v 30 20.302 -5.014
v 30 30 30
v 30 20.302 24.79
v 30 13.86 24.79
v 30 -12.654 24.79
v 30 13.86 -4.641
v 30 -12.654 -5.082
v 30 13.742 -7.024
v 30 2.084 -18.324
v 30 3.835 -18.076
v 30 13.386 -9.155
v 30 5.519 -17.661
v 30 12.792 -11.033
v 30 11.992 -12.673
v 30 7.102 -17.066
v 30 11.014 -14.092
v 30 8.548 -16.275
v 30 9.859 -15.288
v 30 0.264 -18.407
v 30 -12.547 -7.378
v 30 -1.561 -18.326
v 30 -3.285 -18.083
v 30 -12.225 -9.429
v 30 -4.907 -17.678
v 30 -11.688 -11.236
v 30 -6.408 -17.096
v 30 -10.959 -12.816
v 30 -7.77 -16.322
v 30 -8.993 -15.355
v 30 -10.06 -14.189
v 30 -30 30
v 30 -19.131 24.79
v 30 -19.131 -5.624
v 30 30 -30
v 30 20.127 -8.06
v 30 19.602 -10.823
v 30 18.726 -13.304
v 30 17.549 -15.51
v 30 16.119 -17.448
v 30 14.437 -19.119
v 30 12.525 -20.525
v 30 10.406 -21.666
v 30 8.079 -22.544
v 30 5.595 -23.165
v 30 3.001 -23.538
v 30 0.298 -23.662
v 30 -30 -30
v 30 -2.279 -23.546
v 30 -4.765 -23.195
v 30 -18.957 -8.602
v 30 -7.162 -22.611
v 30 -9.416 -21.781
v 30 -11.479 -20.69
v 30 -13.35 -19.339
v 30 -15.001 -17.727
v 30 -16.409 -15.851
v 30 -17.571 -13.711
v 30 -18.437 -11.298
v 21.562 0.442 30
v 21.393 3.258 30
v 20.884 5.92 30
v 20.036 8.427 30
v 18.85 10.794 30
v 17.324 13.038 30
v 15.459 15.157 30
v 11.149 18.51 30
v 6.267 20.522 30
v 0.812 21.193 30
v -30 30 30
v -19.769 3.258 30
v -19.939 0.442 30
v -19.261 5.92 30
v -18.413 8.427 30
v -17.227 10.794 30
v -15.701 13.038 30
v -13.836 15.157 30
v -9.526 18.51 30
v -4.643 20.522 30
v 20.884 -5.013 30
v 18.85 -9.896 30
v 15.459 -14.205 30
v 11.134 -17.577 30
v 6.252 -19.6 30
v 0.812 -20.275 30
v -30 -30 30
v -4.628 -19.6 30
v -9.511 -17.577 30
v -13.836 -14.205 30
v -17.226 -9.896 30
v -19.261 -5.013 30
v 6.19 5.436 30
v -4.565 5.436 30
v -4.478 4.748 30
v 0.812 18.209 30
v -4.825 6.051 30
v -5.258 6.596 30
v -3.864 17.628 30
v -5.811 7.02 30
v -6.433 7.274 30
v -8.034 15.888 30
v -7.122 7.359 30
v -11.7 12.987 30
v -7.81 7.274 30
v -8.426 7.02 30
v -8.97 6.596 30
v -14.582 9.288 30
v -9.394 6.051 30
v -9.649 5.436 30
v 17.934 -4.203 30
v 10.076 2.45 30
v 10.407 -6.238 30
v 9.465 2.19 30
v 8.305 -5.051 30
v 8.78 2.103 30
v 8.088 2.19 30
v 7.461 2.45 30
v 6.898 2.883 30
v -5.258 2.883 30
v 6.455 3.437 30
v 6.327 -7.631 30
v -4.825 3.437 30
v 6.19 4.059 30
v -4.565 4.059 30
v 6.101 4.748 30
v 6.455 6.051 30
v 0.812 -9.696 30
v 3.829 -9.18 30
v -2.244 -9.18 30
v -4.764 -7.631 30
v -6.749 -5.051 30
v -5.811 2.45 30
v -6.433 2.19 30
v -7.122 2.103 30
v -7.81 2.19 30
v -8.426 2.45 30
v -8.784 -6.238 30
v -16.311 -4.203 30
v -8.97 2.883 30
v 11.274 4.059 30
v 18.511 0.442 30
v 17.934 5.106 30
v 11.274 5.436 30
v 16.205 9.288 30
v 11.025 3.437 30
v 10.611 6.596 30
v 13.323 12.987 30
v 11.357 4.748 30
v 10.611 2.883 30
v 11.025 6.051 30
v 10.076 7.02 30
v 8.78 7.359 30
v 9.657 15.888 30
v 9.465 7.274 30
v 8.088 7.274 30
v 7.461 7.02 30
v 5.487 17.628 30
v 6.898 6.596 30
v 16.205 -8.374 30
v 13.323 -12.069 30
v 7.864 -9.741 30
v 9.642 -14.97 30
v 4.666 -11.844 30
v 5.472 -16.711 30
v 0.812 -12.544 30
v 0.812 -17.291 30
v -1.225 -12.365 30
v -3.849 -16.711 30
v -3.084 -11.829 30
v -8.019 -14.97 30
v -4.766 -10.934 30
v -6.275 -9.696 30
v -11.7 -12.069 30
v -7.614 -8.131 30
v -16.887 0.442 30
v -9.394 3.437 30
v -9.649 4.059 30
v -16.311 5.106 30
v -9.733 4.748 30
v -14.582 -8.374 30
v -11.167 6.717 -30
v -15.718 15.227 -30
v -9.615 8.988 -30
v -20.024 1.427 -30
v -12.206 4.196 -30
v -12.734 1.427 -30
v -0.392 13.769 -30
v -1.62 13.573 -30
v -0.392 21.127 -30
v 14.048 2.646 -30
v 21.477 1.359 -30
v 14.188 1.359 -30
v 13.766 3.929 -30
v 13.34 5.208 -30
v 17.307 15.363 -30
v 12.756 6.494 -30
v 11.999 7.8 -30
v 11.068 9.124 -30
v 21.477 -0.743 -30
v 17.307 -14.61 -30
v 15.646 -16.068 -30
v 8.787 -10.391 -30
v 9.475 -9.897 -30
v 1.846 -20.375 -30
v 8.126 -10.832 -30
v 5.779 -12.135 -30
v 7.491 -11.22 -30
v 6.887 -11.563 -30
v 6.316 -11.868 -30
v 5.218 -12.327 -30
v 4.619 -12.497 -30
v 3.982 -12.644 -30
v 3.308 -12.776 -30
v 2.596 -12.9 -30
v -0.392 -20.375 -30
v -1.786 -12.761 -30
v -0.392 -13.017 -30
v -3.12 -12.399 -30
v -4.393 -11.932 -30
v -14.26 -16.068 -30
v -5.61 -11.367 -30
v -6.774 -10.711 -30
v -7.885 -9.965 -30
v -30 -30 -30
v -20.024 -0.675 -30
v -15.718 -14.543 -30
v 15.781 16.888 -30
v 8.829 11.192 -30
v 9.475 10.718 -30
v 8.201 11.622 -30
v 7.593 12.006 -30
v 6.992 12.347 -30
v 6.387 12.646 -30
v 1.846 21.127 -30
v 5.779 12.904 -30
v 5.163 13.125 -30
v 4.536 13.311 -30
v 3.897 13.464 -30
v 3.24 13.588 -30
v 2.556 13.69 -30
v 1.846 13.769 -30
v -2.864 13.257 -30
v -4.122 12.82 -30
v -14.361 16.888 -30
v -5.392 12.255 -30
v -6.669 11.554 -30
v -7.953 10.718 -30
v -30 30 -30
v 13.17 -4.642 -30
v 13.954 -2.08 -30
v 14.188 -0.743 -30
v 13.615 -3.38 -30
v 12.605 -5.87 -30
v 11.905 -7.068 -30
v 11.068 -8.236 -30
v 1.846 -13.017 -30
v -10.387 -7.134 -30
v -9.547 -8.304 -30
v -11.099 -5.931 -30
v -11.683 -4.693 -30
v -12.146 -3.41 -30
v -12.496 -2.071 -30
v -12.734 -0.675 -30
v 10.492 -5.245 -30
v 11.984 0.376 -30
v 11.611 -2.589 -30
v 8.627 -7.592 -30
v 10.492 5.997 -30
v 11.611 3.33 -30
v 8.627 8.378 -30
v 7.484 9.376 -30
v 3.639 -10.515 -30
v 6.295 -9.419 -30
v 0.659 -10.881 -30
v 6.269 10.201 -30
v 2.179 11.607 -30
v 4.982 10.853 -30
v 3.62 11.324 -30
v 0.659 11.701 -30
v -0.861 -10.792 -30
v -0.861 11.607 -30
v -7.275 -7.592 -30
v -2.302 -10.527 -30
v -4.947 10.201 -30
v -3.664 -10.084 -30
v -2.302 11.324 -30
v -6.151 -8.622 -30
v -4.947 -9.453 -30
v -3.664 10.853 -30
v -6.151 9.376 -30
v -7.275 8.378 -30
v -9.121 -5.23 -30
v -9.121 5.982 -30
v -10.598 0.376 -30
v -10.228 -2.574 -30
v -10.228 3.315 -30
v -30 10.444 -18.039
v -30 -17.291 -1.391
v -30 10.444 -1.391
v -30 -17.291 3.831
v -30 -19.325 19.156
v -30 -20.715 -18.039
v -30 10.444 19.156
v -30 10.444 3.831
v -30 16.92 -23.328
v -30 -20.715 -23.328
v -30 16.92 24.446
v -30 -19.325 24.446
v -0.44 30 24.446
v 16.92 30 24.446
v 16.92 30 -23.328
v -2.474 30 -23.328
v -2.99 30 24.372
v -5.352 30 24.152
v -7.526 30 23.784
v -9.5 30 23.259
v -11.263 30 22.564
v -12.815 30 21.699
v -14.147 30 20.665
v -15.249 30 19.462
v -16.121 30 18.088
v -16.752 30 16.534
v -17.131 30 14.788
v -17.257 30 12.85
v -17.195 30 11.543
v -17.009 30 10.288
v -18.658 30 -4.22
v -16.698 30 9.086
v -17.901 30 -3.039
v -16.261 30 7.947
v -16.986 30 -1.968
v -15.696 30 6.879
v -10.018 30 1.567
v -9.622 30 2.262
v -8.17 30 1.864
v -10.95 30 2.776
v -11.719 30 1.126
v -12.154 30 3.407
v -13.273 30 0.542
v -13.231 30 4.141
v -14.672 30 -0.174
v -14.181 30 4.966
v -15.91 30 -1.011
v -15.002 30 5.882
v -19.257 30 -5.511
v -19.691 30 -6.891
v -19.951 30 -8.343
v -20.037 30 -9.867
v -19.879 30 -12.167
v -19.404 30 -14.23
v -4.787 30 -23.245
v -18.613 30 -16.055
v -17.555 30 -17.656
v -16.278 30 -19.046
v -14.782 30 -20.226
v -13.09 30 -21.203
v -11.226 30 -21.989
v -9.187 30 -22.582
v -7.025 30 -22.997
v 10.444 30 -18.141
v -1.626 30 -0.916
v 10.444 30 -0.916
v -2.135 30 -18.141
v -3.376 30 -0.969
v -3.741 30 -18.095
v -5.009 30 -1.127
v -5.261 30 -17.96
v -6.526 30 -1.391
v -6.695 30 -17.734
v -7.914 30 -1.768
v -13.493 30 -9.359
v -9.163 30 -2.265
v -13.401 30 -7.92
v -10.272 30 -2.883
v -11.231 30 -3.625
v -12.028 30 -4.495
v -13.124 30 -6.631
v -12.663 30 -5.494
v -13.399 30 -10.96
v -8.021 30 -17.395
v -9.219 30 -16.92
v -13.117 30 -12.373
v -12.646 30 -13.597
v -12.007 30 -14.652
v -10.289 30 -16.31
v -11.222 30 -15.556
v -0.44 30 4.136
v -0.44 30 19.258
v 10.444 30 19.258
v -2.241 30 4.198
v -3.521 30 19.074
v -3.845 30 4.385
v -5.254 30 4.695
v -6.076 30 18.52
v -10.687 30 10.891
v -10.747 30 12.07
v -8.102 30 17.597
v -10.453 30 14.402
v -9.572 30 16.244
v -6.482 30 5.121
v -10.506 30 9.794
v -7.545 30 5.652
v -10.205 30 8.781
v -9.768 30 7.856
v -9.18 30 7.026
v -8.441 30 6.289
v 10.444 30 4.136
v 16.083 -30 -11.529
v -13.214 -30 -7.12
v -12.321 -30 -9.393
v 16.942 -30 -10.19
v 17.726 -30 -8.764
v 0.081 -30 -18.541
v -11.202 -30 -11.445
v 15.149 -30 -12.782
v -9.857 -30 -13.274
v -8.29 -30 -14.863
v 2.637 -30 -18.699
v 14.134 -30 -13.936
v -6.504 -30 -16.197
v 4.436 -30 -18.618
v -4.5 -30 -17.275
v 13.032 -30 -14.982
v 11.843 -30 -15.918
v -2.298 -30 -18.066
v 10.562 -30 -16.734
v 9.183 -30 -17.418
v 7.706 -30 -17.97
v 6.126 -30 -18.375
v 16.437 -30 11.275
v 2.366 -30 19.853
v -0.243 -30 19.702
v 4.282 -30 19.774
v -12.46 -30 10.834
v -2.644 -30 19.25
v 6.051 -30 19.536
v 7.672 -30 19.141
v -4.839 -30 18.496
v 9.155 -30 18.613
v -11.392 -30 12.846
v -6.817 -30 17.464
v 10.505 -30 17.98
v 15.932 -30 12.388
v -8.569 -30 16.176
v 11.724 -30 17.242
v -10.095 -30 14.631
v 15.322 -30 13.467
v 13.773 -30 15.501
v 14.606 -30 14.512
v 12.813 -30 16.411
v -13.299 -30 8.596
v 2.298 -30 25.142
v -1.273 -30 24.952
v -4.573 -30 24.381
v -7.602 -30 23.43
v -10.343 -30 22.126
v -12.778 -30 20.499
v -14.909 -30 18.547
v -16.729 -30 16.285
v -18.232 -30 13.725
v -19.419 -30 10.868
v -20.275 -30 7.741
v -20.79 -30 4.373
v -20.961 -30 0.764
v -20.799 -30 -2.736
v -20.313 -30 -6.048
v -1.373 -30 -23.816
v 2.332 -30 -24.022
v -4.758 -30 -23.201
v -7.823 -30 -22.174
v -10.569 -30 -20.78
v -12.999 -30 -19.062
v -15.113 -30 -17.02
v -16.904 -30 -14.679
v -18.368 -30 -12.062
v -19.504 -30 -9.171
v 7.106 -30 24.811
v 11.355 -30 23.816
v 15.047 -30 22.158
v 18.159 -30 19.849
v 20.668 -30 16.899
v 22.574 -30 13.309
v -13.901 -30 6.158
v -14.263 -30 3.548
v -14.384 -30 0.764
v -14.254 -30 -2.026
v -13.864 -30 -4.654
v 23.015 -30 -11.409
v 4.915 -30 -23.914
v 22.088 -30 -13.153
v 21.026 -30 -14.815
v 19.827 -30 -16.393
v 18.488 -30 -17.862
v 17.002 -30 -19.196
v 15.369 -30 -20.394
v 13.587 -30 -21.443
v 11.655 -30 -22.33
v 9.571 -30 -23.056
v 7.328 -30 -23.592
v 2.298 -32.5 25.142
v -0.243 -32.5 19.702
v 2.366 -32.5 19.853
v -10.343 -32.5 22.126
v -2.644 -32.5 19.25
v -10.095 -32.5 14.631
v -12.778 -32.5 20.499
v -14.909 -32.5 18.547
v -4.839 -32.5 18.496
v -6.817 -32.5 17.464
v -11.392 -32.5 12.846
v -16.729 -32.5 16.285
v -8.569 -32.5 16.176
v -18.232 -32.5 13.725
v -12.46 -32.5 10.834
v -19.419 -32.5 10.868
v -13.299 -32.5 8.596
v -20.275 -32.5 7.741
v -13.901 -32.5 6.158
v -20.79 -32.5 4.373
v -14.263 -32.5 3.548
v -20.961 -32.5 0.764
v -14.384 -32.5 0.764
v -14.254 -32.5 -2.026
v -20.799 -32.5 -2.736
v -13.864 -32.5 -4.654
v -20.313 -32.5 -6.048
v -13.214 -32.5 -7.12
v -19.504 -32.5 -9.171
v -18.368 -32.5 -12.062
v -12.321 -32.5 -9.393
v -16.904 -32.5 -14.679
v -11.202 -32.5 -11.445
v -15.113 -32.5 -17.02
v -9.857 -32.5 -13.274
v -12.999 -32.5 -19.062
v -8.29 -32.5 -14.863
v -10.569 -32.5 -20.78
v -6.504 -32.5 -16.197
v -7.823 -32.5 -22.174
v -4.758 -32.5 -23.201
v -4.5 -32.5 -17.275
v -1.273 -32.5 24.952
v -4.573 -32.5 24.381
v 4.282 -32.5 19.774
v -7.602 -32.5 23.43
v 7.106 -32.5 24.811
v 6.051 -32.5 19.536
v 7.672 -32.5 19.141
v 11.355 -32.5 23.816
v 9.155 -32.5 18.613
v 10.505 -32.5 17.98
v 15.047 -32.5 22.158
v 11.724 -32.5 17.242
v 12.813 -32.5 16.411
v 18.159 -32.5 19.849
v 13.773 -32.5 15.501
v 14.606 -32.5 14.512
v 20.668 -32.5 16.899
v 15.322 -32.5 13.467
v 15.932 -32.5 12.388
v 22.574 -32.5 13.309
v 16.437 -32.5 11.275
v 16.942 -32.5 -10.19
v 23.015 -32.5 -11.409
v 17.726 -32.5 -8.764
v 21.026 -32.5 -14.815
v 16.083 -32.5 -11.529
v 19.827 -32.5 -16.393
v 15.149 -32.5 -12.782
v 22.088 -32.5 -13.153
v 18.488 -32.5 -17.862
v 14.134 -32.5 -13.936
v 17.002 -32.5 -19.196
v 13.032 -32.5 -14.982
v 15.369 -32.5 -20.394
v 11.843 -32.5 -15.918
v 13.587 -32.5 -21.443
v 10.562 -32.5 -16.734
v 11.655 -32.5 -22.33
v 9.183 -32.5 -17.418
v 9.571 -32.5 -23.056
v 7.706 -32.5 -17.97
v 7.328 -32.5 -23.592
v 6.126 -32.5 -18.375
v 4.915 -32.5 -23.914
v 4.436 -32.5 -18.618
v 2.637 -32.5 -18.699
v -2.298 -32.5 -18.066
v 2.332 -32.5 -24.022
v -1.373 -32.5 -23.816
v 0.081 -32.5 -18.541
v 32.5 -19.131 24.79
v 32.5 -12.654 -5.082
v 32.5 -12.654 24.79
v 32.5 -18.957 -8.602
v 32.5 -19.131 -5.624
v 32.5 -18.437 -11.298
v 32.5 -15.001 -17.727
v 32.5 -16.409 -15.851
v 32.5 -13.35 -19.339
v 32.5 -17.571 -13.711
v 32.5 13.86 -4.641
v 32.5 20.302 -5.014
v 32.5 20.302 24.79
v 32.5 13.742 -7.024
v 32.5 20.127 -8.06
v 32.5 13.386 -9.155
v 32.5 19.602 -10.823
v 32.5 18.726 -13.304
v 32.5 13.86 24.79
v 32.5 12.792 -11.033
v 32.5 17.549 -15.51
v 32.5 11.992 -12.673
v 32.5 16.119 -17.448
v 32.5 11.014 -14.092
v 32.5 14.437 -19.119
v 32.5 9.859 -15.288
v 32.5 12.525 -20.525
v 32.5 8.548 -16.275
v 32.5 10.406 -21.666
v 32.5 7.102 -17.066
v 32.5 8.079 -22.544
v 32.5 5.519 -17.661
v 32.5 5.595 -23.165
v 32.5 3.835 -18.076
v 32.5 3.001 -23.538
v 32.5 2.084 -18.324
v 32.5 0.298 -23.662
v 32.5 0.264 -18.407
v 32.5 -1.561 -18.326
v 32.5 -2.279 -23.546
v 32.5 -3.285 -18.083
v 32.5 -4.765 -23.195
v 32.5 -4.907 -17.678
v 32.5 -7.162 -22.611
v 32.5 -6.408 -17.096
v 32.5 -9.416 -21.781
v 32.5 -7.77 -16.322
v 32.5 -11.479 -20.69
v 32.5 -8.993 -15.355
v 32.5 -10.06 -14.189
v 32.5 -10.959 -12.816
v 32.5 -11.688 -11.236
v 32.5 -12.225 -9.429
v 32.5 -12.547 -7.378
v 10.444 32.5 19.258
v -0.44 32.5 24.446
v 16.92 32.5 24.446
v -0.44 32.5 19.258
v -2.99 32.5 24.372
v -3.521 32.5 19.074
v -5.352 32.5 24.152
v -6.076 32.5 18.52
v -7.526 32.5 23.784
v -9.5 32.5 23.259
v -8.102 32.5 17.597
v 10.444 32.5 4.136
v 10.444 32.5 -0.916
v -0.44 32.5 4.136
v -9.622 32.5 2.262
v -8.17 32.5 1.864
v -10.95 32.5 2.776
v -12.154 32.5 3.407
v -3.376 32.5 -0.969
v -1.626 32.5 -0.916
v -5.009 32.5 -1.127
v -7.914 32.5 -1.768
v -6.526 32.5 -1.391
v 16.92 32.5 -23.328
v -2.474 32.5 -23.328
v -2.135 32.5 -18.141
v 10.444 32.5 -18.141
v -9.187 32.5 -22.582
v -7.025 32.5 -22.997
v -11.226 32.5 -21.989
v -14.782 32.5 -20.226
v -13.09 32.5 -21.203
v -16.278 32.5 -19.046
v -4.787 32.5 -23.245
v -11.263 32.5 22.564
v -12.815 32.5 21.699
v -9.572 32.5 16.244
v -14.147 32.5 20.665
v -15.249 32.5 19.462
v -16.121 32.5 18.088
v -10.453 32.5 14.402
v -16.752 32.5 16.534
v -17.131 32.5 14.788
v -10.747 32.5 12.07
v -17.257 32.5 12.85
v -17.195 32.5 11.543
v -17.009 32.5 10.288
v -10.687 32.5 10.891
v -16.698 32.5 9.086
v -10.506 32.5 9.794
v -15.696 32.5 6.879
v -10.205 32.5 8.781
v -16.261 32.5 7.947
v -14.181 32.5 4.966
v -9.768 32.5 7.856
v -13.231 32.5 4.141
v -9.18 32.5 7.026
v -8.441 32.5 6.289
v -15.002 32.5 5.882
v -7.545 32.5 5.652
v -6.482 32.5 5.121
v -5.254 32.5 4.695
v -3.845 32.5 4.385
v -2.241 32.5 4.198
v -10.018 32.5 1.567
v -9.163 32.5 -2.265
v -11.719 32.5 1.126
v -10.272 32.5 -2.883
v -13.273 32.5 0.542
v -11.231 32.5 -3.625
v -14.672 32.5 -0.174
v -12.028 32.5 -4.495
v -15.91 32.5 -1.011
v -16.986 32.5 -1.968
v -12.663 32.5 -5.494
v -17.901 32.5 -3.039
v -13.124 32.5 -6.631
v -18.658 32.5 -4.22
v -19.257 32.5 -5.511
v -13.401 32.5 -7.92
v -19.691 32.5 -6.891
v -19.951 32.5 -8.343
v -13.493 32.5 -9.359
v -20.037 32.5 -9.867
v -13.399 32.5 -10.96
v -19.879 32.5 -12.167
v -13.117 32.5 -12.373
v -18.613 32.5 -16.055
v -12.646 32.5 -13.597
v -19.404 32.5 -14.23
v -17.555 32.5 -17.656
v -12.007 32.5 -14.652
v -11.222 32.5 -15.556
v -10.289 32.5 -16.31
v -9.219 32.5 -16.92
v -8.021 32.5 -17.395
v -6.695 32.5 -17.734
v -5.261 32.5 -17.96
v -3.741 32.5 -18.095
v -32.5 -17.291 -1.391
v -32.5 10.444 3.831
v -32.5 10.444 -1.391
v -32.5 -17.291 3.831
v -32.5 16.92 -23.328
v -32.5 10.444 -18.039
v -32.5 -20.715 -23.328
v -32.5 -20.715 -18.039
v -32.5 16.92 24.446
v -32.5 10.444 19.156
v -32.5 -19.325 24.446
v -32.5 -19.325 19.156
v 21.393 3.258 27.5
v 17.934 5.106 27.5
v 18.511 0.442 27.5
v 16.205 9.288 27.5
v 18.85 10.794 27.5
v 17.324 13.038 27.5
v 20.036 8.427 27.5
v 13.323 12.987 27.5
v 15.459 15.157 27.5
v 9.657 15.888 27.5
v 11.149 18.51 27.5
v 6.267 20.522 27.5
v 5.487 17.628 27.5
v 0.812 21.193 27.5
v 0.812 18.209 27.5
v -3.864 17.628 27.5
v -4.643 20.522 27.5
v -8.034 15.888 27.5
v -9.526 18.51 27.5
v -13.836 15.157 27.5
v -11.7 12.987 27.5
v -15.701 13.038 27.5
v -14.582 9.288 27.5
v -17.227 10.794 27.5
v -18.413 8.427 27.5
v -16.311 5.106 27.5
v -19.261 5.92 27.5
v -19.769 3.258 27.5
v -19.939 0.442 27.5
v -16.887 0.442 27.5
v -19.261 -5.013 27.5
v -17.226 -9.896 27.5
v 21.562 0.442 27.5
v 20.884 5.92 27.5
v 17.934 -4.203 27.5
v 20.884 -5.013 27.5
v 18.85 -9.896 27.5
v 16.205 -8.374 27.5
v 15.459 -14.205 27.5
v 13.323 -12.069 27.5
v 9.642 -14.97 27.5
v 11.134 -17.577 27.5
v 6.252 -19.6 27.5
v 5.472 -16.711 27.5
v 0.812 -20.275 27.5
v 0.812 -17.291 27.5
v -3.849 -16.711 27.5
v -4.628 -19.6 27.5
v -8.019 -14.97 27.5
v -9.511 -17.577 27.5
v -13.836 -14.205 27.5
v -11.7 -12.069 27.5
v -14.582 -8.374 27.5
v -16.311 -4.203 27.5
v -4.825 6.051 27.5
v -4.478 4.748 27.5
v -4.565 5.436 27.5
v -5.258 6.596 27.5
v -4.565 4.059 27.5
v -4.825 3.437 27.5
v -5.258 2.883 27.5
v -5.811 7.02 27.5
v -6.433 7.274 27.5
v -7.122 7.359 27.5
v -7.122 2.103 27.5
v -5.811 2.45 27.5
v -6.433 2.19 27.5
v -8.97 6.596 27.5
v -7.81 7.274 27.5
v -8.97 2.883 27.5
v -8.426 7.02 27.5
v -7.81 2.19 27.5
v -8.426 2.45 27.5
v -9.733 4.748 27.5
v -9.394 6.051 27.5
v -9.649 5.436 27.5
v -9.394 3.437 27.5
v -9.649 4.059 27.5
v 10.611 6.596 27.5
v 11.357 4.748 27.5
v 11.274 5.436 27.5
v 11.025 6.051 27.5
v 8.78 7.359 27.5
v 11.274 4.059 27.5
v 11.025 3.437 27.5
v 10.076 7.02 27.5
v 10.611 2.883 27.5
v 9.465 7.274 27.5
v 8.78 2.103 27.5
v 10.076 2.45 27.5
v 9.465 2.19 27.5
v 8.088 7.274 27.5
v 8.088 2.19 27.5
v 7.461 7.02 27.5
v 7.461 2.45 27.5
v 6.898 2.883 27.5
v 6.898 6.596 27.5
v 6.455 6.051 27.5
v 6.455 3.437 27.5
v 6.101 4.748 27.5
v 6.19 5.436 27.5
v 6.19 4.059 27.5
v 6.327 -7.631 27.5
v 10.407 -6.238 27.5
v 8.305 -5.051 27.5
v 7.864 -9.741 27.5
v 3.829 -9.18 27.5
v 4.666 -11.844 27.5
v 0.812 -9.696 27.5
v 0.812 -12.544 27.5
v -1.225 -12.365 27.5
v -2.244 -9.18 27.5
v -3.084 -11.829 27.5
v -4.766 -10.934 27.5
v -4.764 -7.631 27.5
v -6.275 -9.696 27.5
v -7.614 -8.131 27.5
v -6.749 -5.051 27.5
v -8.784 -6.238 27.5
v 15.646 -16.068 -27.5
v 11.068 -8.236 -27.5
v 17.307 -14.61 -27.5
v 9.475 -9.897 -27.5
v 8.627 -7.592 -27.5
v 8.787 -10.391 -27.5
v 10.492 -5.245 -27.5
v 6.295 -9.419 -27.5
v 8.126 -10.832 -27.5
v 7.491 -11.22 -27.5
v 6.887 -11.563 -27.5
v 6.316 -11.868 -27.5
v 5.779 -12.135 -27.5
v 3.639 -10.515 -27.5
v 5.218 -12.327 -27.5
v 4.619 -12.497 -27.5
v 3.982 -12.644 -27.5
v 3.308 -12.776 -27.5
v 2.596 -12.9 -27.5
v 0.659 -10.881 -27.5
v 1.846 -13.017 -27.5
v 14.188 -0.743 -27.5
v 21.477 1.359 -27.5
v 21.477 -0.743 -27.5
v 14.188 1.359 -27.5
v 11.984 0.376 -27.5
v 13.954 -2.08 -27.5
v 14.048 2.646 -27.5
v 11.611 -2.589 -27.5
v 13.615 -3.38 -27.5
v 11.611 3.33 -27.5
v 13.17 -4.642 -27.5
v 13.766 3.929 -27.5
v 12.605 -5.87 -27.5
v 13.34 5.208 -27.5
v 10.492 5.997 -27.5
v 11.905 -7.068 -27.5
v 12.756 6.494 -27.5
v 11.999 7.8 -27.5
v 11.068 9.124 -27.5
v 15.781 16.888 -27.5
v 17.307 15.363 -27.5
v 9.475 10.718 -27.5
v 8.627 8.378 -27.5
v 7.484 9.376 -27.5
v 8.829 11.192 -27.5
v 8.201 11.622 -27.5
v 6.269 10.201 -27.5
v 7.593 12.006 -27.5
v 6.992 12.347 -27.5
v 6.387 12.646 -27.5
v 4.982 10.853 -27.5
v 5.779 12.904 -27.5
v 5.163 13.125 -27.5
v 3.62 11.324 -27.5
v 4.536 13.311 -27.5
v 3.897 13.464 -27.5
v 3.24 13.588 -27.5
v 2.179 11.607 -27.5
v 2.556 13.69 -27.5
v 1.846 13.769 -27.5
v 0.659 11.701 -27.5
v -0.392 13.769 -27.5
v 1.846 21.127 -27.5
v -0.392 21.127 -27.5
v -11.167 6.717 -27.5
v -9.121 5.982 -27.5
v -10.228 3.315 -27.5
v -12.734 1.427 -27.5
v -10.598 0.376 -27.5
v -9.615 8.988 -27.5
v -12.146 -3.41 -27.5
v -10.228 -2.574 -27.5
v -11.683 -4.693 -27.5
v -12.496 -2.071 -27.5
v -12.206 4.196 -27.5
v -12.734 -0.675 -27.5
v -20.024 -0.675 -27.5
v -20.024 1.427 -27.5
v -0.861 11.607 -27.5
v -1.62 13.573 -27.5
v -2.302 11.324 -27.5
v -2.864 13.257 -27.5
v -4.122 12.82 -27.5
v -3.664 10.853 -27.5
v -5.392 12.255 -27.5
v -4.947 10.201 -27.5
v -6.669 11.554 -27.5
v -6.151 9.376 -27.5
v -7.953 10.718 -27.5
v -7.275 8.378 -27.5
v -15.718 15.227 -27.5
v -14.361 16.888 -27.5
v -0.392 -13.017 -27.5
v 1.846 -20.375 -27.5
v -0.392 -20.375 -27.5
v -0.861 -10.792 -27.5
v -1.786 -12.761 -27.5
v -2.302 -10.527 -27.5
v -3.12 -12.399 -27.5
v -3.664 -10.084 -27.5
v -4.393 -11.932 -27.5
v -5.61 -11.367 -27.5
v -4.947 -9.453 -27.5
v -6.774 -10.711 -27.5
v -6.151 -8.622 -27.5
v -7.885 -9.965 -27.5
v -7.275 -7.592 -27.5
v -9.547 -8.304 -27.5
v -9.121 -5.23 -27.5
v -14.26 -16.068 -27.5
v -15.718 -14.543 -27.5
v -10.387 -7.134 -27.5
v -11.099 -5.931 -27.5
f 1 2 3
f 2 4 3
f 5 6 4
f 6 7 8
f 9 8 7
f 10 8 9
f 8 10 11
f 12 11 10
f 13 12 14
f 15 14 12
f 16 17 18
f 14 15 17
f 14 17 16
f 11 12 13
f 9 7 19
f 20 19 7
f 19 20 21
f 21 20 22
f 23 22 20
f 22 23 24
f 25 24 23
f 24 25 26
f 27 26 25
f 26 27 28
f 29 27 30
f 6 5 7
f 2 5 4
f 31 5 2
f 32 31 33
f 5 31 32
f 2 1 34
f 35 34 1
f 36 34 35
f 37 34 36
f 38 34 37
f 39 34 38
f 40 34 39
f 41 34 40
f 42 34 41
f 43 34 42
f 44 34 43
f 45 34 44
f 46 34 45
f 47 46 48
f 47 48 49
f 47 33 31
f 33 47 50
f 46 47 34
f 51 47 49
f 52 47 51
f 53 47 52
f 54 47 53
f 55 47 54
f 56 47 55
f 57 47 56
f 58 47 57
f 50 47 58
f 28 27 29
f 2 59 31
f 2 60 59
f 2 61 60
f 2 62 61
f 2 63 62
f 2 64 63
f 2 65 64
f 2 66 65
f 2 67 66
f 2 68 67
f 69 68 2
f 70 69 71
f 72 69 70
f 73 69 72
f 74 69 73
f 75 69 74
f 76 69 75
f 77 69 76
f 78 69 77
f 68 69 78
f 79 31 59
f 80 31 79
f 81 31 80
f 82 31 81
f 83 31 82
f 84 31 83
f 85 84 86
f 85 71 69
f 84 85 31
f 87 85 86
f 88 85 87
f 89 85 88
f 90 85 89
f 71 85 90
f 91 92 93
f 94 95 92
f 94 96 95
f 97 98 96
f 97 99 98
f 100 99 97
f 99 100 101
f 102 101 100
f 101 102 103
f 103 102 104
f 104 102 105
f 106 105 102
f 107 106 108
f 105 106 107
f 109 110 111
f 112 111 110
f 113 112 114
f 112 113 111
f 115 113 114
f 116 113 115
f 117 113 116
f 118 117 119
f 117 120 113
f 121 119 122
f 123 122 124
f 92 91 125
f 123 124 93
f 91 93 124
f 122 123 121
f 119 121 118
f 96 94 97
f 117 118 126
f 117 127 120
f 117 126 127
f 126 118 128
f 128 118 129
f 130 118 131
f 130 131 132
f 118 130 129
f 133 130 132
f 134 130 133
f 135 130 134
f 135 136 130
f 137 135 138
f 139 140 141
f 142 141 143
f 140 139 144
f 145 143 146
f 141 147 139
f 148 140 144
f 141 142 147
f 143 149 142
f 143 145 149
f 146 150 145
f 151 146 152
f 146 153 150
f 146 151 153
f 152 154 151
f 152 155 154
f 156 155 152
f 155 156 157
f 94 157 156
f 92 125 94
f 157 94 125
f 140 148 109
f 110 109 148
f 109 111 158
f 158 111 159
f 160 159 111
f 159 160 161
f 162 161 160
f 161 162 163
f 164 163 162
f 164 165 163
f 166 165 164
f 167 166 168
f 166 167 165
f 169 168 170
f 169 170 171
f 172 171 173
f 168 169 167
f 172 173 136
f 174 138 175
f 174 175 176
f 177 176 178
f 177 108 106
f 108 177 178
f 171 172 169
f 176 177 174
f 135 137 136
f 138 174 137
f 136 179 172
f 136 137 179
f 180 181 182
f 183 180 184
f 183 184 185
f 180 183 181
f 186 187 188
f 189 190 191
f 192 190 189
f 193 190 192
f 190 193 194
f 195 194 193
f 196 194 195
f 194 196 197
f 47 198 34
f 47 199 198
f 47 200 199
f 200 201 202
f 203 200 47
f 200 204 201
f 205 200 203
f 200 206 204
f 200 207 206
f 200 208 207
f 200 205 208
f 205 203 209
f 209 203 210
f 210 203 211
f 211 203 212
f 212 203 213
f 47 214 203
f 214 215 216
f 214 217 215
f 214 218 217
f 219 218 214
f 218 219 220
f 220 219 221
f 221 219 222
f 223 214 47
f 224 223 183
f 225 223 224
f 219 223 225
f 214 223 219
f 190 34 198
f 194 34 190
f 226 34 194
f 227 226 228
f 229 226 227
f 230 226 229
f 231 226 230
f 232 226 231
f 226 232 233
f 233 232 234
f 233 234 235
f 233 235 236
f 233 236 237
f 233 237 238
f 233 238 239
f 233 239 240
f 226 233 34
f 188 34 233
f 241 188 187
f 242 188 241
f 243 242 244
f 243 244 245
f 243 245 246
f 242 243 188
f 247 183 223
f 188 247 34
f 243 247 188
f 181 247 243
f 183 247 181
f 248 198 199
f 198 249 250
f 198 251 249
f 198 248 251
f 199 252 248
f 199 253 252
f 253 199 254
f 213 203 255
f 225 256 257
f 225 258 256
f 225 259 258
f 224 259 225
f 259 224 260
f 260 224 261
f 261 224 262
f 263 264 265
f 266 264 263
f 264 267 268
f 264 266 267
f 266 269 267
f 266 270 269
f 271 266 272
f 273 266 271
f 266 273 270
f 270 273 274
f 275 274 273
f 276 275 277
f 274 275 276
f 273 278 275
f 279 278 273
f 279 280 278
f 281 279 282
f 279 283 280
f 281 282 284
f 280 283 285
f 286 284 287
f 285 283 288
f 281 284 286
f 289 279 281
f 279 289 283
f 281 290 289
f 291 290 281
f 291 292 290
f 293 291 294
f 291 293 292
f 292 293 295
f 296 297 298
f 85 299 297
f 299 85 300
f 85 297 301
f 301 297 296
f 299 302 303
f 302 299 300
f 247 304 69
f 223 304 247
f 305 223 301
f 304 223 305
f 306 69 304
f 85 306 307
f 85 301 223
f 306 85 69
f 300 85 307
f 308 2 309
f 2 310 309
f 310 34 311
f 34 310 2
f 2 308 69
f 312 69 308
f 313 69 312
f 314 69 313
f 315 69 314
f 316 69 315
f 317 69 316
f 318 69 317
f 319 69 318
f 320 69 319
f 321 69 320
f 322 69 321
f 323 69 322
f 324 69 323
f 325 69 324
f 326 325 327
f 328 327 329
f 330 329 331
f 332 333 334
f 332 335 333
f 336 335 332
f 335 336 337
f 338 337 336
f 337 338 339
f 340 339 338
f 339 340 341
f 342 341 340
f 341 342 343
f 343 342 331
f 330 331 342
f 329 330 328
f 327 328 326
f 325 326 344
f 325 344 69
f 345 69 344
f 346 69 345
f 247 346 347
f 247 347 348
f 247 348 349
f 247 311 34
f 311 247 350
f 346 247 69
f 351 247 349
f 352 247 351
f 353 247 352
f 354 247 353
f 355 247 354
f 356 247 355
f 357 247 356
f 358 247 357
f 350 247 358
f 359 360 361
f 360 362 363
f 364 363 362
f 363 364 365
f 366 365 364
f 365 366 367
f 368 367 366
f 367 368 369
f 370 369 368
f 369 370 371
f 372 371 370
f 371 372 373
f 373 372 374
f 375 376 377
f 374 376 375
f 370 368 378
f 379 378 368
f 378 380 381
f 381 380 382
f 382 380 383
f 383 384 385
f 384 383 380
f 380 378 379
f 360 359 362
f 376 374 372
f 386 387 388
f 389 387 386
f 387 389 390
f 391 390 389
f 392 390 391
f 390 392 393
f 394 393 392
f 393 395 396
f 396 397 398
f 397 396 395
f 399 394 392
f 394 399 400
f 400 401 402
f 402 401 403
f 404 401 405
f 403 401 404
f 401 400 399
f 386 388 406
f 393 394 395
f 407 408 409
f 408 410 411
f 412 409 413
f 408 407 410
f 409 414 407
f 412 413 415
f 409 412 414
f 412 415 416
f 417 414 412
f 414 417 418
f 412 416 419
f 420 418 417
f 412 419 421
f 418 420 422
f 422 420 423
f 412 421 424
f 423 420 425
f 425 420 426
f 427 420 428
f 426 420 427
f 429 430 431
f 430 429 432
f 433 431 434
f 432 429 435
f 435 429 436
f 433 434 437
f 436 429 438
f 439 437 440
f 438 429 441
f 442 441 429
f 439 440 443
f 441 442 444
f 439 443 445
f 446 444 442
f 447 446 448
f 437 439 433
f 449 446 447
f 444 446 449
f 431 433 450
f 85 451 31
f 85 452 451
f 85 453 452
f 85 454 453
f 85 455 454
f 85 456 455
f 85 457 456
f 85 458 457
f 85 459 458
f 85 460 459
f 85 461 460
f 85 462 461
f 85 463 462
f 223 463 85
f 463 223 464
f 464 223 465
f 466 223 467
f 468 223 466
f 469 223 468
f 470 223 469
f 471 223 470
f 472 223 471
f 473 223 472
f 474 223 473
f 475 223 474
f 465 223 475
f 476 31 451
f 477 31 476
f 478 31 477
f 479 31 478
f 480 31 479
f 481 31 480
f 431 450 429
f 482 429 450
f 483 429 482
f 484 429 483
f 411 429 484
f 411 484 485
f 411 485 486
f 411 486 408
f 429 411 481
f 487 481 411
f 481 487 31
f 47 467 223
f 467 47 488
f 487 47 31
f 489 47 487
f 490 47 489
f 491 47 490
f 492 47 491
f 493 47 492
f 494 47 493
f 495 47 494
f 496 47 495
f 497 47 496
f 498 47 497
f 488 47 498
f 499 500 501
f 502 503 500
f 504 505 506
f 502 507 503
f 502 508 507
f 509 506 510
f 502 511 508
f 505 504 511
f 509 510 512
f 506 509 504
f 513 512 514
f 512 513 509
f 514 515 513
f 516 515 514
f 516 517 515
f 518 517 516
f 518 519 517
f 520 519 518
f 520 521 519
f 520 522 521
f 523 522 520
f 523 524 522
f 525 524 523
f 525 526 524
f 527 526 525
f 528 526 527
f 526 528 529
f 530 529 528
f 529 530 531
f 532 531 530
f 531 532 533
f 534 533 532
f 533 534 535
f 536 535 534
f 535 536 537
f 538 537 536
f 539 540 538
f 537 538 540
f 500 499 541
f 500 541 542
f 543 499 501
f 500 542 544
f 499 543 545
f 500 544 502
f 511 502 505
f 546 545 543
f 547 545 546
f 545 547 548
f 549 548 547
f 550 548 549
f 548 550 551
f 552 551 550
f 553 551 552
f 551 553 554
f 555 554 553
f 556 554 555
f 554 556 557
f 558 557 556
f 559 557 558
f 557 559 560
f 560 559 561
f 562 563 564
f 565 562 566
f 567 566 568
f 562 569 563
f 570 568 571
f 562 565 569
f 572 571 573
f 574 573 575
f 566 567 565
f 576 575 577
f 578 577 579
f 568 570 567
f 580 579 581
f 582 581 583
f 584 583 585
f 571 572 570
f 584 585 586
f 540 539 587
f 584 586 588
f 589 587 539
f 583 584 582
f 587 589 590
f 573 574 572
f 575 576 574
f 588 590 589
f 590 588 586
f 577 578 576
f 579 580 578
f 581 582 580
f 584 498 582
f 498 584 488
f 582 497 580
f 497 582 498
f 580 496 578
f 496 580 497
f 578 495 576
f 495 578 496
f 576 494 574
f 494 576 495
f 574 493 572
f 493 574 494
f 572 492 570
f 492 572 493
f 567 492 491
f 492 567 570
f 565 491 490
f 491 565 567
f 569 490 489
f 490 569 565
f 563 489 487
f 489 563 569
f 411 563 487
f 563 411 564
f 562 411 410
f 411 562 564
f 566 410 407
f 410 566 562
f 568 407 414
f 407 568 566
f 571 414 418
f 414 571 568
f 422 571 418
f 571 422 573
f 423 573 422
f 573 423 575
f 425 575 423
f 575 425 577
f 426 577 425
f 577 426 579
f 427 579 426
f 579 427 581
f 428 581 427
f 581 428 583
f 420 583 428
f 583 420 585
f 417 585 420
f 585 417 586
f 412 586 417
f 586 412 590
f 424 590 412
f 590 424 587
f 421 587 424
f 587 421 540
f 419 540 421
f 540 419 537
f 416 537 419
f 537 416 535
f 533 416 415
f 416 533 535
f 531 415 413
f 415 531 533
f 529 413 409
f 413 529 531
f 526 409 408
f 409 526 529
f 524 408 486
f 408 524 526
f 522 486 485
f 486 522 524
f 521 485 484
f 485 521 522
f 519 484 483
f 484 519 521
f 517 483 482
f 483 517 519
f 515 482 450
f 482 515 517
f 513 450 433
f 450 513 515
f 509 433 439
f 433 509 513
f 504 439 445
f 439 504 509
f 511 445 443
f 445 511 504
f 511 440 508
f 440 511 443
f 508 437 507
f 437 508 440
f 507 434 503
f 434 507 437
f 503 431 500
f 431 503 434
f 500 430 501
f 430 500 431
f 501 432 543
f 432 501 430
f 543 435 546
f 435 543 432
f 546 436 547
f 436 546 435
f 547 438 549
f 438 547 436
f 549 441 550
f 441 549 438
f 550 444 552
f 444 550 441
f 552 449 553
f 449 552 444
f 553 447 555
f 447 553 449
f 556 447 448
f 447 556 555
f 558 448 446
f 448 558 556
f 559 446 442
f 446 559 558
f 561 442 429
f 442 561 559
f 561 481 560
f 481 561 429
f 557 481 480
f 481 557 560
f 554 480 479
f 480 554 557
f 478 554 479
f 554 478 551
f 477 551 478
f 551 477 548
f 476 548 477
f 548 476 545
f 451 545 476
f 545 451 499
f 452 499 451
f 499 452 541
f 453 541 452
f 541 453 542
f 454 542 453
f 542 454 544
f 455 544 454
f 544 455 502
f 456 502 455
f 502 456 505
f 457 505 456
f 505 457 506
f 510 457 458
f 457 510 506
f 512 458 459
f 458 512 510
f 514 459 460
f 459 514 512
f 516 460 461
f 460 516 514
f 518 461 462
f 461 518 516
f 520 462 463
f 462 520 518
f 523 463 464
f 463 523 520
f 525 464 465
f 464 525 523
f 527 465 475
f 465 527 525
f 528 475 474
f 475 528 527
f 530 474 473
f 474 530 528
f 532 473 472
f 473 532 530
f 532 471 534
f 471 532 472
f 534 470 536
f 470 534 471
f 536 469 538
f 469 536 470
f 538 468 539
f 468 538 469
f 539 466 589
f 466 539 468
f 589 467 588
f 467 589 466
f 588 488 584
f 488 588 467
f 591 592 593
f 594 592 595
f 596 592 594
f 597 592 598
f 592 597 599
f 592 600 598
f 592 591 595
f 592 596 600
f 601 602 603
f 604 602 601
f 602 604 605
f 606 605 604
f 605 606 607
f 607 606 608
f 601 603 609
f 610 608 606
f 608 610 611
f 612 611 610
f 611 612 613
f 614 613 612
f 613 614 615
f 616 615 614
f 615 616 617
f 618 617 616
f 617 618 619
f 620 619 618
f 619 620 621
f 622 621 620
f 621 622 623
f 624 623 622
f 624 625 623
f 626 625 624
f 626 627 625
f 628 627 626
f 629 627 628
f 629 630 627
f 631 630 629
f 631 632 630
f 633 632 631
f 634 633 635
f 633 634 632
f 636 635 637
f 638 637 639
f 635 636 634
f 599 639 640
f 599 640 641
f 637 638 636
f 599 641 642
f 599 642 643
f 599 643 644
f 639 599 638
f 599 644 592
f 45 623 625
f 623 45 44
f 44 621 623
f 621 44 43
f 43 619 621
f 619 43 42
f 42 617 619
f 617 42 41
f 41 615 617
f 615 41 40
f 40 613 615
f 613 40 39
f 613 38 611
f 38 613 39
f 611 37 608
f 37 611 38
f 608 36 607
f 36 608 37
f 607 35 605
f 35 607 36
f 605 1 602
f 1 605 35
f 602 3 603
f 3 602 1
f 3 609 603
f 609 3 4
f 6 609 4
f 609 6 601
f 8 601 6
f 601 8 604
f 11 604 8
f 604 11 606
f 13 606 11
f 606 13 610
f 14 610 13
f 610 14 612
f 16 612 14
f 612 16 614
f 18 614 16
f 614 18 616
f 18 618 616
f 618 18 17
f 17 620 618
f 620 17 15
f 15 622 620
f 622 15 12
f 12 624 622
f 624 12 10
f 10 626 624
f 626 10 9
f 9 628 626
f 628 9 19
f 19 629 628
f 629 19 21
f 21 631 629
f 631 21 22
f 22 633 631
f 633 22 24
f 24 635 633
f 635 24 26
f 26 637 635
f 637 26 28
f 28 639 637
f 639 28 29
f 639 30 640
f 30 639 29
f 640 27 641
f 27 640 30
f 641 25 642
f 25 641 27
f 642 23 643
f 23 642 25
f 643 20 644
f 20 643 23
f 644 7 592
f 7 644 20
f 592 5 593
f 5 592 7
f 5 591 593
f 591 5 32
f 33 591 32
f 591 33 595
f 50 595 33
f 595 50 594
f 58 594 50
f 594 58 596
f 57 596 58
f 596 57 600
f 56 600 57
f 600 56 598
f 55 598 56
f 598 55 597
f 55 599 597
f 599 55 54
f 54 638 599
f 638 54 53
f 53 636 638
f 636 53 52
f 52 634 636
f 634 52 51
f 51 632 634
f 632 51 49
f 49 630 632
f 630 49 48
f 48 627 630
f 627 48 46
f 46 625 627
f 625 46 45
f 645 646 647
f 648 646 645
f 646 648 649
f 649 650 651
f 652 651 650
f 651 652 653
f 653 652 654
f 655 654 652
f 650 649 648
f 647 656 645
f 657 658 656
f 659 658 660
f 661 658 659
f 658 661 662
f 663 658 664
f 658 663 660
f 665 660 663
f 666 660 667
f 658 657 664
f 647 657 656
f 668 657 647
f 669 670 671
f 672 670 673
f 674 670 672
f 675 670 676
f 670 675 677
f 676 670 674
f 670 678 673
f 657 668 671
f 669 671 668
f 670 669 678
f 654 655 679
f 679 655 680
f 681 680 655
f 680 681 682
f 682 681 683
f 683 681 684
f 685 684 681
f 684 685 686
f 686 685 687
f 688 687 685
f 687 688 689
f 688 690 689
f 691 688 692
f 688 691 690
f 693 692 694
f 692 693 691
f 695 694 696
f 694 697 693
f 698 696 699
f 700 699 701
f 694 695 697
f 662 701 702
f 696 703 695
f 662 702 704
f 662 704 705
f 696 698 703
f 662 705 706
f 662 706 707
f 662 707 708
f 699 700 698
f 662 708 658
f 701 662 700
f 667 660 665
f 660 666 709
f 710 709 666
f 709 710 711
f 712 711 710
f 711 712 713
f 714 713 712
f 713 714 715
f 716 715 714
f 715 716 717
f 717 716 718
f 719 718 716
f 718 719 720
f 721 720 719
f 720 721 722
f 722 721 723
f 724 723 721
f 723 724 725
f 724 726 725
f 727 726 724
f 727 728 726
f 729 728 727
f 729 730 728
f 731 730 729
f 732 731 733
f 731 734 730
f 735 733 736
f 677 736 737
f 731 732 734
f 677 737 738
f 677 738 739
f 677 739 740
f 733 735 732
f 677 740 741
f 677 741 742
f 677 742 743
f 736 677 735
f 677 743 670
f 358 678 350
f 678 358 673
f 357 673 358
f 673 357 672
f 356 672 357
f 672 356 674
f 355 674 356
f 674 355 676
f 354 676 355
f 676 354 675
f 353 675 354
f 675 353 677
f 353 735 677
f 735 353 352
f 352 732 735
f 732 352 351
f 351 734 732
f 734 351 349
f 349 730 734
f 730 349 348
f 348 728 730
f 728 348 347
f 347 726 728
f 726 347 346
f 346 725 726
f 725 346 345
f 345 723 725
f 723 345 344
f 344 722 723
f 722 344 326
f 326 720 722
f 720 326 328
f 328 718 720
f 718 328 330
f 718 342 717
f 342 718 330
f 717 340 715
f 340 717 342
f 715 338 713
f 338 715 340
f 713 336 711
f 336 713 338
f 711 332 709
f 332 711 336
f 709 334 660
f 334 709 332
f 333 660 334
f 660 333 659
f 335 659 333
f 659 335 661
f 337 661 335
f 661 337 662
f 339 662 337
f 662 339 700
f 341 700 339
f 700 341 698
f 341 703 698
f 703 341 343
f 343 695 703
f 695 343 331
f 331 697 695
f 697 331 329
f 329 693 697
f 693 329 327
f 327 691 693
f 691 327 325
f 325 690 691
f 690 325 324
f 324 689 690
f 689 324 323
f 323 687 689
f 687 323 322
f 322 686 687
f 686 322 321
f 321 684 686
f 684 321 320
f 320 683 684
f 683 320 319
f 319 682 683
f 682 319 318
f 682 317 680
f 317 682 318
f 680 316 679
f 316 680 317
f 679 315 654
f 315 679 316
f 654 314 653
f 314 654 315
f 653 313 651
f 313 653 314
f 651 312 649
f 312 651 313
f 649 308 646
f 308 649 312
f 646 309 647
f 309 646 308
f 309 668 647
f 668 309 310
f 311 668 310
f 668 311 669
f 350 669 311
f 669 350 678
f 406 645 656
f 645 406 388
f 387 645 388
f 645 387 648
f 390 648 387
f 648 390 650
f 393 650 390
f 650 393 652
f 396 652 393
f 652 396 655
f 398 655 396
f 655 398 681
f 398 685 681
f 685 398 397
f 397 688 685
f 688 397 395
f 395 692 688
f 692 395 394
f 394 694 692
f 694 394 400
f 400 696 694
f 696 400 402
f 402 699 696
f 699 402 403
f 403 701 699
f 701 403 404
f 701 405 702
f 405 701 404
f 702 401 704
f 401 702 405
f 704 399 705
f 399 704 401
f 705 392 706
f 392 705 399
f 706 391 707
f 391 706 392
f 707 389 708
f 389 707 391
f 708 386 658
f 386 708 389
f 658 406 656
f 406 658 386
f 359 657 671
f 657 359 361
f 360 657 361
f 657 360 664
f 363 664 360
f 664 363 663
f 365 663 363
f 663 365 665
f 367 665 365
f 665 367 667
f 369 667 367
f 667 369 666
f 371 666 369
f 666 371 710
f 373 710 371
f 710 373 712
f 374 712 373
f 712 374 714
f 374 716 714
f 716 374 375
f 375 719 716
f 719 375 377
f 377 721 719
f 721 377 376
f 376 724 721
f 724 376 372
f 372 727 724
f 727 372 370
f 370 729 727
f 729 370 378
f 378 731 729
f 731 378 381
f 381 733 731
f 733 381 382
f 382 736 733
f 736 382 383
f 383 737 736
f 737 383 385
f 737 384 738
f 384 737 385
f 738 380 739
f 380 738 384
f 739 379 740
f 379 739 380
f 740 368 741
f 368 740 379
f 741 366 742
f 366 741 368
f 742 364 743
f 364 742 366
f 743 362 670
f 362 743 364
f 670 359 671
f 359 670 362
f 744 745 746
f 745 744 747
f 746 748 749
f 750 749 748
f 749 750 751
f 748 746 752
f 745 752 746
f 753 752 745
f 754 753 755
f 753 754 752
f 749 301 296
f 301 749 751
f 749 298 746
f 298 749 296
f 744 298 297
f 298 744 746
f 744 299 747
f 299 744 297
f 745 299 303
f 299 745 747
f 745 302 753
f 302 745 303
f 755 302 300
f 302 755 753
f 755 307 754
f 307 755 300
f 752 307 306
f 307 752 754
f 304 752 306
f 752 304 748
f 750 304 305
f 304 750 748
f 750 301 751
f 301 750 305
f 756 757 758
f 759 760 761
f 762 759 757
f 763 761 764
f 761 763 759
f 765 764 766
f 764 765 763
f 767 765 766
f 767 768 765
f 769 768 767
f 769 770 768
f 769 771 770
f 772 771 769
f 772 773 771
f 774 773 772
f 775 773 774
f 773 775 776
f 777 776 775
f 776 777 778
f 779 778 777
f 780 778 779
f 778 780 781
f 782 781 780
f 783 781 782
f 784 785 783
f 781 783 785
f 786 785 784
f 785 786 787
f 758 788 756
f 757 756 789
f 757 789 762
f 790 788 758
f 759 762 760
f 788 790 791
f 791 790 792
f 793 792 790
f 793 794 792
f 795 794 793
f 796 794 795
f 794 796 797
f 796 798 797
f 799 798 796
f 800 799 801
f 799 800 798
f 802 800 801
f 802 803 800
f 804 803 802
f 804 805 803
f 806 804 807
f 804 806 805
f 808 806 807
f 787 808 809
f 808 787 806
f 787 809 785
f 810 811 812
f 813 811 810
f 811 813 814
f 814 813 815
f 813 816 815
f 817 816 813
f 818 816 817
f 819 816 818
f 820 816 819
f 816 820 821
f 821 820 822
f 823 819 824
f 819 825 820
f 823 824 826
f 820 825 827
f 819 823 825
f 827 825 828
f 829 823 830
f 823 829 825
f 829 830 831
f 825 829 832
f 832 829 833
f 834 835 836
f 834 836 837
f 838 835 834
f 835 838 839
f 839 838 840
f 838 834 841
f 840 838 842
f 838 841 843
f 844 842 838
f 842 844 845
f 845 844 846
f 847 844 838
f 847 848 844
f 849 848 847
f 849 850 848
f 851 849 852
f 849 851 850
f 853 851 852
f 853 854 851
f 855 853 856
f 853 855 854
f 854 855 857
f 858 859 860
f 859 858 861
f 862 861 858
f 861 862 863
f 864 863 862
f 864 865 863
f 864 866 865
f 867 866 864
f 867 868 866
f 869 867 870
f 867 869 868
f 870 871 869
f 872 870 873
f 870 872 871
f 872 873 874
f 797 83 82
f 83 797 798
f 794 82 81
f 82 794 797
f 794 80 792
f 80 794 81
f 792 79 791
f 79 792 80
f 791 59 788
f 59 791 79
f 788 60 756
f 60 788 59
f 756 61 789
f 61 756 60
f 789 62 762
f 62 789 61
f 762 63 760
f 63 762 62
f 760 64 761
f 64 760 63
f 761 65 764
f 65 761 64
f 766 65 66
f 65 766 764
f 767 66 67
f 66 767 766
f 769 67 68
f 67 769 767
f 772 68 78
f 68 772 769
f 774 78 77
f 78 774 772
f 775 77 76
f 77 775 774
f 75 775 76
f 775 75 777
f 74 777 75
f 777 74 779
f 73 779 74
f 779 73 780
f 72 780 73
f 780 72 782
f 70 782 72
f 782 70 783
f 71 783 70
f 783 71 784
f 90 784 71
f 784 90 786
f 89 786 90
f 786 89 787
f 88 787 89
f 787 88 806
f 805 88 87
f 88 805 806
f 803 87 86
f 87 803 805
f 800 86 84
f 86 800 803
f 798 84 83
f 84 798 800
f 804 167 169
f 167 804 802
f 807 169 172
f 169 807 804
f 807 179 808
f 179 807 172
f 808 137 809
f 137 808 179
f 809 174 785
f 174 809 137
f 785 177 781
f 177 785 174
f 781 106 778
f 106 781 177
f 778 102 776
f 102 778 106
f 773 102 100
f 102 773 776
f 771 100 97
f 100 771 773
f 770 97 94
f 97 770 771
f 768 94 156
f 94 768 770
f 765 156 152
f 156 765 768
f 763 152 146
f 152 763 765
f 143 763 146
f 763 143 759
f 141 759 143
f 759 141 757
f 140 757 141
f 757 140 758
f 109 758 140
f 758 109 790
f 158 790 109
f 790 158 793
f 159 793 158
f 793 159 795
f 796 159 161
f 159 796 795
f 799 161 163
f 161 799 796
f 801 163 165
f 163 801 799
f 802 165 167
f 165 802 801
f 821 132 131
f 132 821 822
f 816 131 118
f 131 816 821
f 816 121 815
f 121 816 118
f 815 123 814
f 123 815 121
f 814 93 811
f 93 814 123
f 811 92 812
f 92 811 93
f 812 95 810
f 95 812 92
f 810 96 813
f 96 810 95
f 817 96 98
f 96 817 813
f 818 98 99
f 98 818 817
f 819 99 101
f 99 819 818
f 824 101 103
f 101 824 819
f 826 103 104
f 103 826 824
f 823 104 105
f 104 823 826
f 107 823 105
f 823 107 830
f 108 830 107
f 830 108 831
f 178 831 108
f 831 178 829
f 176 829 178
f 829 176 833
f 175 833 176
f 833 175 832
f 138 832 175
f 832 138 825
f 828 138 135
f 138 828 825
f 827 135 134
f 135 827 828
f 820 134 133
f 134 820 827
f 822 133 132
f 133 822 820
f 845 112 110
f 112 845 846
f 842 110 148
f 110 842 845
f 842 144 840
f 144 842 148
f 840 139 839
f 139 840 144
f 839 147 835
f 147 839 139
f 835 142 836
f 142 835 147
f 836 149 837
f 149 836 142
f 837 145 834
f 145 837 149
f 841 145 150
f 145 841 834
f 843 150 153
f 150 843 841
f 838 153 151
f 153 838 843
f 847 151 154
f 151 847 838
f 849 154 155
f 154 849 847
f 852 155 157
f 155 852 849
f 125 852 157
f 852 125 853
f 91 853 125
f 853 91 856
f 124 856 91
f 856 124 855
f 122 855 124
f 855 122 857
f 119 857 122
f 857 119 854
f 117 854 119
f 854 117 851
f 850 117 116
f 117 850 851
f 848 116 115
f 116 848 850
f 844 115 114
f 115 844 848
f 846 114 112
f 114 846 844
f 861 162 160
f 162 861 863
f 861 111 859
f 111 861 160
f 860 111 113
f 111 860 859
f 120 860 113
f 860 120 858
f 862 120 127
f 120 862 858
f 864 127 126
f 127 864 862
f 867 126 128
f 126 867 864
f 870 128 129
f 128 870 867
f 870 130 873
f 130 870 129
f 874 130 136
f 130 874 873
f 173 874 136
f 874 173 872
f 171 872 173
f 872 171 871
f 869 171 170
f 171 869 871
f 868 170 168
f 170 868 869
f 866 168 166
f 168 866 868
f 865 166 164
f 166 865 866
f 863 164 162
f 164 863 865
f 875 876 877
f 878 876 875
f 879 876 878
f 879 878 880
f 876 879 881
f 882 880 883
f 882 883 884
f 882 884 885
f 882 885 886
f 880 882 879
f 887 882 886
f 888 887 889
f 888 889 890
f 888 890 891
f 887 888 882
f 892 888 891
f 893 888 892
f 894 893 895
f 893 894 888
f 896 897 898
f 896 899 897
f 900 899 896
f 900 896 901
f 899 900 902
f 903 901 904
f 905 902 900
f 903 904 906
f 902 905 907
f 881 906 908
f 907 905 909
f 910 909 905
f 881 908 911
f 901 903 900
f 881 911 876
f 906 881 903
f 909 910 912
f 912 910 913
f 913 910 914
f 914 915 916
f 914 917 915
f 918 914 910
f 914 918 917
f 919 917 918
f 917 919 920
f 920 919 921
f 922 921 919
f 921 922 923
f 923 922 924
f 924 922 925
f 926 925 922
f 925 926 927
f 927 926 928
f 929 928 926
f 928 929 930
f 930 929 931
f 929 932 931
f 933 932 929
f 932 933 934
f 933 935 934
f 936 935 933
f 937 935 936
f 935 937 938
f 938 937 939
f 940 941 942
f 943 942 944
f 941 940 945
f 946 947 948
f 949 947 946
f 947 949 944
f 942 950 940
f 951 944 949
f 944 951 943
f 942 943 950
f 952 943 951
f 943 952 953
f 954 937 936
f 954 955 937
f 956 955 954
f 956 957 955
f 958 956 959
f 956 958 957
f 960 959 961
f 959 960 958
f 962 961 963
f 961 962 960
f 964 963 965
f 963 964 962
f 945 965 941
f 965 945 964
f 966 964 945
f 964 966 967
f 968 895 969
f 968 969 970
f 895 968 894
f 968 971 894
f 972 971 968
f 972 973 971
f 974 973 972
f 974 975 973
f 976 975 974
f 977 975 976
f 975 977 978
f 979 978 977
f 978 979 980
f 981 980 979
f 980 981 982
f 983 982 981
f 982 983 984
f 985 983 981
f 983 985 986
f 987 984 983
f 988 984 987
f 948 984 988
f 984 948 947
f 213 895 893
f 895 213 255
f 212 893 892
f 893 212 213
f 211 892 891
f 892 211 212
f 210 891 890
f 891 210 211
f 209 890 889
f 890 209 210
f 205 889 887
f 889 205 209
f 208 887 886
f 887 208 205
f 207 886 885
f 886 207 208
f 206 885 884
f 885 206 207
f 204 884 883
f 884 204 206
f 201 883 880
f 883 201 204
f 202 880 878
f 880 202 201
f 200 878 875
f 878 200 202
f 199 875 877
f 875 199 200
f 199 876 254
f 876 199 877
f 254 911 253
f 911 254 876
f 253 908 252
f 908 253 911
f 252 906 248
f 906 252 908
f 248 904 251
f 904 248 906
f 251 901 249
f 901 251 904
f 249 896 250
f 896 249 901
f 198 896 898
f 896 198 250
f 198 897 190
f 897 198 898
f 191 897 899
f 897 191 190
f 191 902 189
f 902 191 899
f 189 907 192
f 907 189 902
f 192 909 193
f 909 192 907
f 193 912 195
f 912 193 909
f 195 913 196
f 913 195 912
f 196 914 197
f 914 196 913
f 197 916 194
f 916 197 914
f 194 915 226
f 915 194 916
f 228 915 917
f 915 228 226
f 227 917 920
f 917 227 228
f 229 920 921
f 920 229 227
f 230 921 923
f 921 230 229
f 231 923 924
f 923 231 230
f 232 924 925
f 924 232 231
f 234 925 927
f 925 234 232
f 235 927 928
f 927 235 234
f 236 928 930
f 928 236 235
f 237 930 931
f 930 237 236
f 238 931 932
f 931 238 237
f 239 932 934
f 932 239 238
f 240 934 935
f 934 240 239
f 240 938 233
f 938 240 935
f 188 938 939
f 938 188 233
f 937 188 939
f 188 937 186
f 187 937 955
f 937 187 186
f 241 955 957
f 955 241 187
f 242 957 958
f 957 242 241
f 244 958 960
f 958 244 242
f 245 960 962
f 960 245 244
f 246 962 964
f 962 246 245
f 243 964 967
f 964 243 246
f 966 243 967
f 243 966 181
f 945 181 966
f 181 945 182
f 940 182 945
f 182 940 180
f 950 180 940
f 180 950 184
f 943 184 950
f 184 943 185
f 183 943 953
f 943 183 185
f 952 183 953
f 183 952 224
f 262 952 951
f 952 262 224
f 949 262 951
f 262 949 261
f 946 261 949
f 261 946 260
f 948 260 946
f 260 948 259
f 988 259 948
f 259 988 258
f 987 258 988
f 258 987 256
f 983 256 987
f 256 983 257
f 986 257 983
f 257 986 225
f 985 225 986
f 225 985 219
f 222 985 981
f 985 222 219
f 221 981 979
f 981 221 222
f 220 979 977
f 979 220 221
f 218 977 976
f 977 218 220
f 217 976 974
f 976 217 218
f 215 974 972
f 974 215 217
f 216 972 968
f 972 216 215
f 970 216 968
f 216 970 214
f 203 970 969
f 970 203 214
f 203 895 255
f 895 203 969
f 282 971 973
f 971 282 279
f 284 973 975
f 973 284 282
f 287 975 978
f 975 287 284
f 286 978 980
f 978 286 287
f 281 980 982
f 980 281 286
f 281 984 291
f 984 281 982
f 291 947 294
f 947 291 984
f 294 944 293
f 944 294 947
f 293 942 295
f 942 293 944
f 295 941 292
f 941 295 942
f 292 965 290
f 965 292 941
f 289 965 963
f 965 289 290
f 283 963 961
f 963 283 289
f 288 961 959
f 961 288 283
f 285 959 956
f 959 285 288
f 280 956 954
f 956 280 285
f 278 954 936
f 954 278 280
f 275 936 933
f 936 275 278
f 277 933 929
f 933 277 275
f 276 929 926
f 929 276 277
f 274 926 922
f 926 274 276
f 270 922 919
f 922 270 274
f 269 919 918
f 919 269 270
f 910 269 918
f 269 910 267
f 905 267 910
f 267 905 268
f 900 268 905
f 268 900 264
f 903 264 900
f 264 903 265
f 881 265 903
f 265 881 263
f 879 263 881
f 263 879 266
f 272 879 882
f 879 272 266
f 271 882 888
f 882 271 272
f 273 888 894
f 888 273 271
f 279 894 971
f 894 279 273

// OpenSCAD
// text_on_cube.scad - Example for text() usage in OpenSCAD

echo(version=version());

font = "Liberation Sans";

cube_size = 60;
letter_size = 50;
letter_height = 5;

o = cube_size / 2 - letter_height / 2;

module letter(l) {
  // Use linear_extrude() to make the letters 3D objects as they
  // are only 2D shapes when only using text()
  linear_extrude(height = letter_height) {
    text(l, size = letter_size, font = font, halign = "center", valign = "center", $fn = 16);
  }
}

difference() {
  union() {
    color("gray") cube(cube_size, center = true);
    translate([0, -o, 0]) rotate([90, 0, 0]) letter("C");
    translate([o, 0, 0]) rotate([90, 0, 90]) letter("U");
    translate([0, o, 0]) rotate([90, 0, 180]) letter("B");
    translate([-o, 0, 0]) rotate([90, 0, -90]) letter("E");
  }

  // Put some symbols on top and bottom using symbols from the
  // Unicode symbols table.
  // (see https://en.wikipedia.org/wiki/Miscellaneous_Symbols)
  //
  // Note that depending on the font used, not all the symbols
  // are actually available.
  translate([0, 0, o])  letter("\u263A");
  translate([0, 0, -o - letter_height])  letter("\u263C");
}



// Written in 2014 by Torsten Paul <Torsten.Paul@gmx.de>
//
// To the extent possible under law, the author(s) have dedicated all
// copyright and related and neighboring rights to this software to the
// public domain worldwide. This software is distributed without any
// warranty.
//
// You should have received a copy of the CC0 Public Domain
// Dedication along with this software.
// If not, see <http://creativecommons.org/publicdomain/zero/1.0/>.
